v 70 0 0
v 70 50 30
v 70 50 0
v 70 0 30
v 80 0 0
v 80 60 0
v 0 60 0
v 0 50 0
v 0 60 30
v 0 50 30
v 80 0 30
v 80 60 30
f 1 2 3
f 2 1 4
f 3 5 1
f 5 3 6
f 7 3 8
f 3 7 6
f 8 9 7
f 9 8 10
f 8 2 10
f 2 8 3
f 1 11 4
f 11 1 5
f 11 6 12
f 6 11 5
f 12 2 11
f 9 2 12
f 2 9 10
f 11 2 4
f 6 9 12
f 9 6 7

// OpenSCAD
// Two-part box enclosure for a small electronics board, printed as one piece with a part
// between them. NOVEL general part.
//

box_x   = 70;
box_y   = 50;
box_z   = 30;
wall    = 2;
floor   = 2;

lip_t   = 1.5;
lip_h   = 4;
clearance = 0.2;

$fn = 48;

part_size_x = box_x + 10;
part_size_y = box_y + 10;
part_size_z = max(box_z, floor + lip_h + lip_t);      // tall enough for the box and the lip

difference() {
    cube([part_size_x, part_size_y, part_size_z]);
    for (p = [box_x + 5, box_y + 5])
        translate(p) cube([box_x, box_y, box_z + 1]);   // hollow the first (taller) part
}
